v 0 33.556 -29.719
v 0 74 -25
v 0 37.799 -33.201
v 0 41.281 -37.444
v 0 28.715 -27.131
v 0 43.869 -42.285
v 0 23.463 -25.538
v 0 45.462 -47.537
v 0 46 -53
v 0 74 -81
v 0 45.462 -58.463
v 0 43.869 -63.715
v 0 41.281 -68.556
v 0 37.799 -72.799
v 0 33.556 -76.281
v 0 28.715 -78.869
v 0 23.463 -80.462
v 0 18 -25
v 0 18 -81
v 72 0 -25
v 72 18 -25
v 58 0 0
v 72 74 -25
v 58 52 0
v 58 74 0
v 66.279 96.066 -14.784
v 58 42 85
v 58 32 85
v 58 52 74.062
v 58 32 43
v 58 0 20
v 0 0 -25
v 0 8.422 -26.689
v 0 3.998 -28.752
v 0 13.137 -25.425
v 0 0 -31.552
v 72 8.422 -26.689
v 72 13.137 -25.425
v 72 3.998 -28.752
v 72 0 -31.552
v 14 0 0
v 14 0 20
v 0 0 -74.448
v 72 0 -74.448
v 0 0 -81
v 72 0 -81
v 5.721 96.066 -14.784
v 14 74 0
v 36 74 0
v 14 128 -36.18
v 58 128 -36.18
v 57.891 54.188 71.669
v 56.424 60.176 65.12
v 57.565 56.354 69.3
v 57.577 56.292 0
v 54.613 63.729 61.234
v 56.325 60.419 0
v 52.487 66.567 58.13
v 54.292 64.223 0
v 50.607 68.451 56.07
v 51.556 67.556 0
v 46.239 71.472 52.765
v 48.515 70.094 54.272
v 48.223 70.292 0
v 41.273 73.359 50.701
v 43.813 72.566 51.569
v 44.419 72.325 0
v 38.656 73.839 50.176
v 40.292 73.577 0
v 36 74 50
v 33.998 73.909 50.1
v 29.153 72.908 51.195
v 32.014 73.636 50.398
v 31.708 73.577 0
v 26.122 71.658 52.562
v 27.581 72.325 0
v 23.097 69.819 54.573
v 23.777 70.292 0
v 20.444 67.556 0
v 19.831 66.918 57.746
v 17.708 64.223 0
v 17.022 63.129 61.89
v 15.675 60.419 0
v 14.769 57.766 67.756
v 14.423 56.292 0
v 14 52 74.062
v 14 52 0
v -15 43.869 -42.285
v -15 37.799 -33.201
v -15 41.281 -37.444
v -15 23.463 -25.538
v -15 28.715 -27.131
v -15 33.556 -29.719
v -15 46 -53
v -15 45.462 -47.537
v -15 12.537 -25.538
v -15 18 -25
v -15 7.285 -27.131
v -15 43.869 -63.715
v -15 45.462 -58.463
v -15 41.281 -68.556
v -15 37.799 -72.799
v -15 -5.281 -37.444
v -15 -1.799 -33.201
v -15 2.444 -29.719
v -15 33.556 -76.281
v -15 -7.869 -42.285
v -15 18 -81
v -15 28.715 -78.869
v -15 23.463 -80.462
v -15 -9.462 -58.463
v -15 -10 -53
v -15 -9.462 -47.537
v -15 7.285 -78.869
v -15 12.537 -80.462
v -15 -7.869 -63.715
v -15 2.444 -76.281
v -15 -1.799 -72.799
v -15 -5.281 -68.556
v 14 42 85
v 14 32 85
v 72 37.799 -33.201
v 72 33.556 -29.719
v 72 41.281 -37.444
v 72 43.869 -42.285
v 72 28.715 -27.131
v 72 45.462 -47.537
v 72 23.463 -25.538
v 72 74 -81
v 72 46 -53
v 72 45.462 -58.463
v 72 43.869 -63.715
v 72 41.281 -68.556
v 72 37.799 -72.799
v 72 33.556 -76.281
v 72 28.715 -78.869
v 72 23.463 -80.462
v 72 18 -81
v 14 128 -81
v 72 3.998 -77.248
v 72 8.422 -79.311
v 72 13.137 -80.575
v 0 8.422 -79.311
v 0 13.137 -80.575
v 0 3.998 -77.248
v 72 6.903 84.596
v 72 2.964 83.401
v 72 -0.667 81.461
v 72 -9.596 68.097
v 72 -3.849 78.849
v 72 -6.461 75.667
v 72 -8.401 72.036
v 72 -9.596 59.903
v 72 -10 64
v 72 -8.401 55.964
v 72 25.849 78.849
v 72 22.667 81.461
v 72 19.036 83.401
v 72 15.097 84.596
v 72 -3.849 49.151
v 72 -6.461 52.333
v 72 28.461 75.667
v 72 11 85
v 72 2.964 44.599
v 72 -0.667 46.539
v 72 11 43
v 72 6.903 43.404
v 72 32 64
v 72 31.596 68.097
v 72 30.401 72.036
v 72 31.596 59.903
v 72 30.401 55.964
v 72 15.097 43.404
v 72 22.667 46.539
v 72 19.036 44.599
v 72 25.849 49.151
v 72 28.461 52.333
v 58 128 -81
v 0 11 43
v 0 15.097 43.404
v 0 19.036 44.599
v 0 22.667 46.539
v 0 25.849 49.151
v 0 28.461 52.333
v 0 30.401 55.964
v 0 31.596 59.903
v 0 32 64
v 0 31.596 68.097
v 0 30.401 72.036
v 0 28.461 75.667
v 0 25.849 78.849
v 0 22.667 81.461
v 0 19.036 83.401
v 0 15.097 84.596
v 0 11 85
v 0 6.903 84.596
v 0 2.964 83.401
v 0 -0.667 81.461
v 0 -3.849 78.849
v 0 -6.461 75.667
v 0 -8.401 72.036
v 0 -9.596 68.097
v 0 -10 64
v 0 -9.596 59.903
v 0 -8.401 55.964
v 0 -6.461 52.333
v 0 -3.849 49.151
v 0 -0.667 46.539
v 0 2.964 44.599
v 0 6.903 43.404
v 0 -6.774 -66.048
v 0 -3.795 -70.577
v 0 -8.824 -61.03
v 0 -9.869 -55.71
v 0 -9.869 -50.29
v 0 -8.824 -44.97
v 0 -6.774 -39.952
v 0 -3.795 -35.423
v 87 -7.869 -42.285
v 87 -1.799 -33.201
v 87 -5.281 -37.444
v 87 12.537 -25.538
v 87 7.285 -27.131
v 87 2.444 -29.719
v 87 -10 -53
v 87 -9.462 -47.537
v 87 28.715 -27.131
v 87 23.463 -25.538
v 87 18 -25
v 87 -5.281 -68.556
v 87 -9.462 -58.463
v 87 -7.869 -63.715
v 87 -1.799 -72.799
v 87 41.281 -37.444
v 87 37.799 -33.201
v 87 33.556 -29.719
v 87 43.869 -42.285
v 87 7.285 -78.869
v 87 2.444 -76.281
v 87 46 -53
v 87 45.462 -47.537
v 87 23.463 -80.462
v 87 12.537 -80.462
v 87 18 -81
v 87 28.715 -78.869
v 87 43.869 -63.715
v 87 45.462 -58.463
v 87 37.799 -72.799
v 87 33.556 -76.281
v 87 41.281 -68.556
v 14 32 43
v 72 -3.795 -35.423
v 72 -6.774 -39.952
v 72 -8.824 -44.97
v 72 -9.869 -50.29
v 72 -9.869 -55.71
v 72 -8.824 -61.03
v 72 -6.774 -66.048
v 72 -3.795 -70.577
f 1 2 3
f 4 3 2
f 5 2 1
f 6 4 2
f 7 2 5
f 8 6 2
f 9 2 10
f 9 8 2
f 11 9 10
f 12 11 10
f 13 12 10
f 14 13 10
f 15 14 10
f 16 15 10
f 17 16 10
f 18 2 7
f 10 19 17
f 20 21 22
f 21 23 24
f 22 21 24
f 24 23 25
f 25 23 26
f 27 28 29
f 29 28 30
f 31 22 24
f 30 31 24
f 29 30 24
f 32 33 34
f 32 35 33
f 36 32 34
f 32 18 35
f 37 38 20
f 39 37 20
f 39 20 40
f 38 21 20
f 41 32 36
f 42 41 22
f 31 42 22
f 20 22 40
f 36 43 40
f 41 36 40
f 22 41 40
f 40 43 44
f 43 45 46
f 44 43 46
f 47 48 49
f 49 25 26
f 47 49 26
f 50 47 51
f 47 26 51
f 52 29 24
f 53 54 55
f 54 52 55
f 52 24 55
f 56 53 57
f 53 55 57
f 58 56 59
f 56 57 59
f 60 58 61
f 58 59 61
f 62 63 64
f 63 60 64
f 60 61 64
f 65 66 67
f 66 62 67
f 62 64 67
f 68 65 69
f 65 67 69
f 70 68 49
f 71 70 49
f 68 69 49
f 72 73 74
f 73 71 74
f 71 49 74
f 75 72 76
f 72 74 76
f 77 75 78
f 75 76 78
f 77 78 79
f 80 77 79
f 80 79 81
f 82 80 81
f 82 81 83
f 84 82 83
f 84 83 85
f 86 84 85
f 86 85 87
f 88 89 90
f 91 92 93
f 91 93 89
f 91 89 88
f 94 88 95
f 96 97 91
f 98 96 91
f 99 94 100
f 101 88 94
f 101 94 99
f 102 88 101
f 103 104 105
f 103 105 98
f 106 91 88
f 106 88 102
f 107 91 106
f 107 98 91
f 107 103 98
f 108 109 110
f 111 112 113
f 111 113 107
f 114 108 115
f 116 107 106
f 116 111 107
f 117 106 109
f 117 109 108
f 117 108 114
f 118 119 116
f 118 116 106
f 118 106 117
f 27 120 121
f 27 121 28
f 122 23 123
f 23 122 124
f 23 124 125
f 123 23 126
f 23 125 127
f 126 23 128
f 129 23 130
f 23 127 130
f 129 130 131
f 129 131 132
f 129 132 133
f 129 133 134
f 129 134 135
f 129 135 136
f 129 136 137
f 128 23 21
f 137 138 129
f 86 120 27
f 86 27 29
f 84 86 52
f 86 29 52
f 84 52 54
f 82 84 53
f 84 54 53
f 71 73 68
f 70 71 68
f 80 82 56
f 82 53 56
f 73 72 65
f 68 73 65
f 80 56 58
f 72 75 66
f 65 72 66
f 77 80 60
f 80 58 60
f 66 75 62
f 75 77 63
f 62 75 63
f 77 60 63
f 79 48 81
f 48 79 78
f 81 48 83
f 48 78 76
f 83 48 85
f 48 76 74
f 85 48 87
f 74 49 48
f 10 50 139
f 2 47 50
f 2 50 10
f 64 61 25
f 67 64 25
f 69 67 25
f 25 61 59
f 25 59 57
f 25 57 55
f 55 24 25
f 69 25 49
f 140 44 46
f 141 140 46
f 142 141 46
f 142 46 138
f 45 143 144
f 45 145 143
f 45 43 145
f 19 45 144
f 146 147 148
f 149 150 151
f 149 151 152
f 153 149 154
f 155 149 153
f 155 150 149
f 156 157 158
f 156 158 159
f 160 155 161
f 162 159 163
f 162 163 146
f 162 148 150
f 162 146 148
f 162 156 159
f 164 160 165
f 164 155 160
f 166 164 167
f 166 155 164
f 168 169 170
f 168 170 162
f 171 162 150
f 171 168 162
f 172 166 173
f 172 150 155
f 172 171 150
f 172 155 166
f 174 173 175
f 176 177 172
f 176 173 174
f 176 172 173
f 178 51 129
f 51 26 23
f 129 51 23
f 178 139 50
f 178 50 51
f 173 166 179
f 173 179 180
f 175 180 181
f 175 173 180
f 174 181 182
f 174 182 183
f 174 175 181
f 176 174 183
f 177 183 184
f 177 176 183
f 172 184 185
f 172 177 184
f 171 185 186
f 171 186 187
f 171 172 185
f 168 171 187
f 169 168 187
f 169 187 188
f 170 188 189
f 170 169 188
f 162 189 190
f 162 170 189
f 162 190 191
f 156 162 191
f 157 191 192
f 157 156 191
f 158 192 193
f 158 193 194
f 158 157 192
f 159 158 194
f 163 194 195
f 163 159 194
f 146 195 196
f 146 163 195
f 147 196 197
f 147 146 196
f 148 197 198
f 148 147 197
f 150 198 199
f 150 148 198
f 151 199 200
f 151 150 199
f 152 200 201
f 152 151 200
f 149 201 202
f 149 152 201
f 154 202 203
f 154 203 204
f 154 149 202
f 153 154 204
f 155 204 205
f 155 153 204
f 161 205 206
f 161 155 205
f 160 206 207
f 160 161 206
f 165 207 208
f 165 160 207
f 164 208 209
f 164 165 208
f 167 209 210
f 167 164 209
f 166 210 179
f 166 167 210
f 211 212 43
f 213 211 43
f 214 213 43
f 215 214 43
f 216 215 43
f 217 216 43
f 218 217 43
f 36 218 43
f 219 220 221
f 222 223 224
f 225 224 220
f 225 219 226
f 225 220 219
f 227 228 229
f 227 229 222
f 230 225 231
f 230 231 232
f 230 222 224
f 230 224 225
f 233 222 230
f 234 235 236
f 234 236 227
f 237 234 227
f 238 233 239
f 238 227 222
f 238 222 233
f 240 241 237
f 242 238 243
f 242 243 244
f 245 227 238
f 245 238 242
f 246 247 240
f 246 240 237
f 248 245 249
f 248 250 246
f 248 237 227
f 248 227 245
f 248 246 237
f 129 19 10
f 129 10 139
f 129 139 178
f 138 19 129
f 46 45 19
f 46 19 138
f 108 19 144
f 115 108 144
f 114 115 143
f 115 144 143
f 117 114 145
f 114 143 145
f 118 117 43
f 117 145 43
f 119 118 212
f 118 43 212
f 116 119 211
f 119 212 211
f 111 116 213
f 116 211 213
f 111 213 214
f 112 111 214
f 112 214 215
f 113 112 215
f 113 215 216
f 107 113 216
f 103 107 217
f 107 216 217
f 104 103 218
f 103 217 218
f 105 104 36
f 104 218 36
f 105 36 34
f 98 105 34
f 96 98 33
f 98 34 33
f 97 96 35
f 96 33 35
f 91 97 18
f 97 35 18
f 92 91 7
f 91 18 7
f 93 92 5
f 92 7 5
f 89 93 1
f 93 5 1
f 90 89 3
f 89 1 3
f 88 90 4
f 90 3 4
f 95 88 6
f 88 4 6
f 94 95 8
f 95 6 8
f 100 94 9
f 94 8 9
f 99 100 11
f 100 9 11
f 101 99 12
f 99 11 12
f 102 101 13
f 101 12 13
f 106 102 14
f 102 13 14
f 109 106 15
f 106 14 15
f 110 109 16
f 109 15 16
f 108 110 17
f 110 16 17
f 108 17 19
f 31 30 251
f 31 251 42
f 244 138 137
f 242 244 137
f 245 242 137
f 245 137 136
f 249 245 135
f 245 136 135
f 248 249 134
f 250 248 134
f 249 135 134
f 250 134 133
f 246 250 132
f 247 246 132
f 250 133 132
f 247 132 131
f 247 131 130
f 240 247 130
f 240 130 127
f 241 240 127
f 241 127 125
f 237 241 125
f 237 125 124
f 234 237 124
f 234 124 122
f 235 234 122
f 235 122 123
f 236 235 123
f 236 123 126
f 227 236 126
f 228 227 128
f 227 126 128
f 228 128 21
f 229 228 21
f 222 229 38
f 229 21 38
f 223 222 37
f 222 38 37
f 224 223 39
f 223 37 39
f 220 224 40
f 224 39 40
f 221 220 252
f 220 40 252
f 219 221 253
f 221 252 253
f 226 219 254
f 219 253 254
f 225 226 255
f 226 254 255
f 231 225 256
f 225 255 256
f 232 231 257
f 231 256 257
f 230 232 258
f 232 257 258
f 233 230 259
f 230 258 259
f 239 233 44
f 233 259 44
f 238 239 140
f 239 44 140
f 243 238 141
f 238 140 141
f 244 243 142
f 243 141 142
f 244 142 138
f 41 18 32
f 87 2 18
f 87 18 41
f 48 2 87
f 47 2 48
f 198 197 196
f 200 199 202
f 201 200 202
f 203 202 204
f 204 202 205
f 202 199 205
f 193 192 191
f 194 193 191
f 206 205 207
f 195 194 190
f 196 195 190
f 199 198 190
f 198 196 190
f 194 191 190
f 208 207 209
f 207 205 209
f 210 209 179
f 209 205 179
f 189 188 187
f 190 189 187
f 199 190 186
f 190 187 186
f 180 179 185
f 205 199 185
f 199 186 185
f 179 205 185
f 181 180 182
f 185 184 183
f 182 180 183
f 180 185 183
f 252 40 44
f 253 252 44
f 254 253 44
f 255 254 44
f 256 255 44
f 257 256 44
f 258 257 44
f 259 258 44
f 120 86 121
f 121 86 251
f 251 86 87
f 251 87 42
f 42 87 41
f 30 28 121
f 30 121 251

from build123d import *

# Parameters (mm, degrees)
SKETCH1_W           = 72
SKETCH1_H           = 81
BOSS_EXTRUDE1_DEPTH = 128
CUT_EXTRUDE1_DEPTH  = 129
CUT_EXTRUDE2_DEPTH  = 82
CUT_EXTRUDE3_DEPTH  = 128
SKETCH5_R           = 28
BOSS_EXTRUDE2_DEPTH = 15
SKETCH6_R           = 28
BOSS_EXTRUDE3_DEPTH = 15
BOSS_EXTRUDE4_DEPTH = 85
CUT_EXTRUDE4_DEPTH  = 85
SKETCH10_R          = 21
BOSS_EXTRUDE5_DEPTH = 72


with BuildPart() as part:
    # Sketch1 → Boss-Extrude1 (new body)
    with BuildSketch(Plane(origin=(0, 0, 0), x_dir=(1, 0, 0), z_dir=(0, 1, 0))):
        with Locations((36, 40.5)):
            Rectangle(SKETCH1_W, SKETCH1_H)
    extrude(amount=BOSS_EXTRUDE1_DEPTH)

    # Sketch2 → Cut-Extrude1 (cut, through all)
    with BuildSketch(Plane(origin=(0, 128, 0), x_dir=(1, 0, 0), z_dir=(0, 1, 0))):
        Polygon((72, 25), (58, 0), (72, 0), align=None)
        Polygon((14, 0), (0, 0), (0, 25), align=None)
    extrude(amount=-CUT_EXTRUDE1_DEPTH, mode=Mode.SUBTRACT)

    # Sketch3 → Cut-Extrude2 (cut, through all)
    with BuildSketch(Plane.XY):
        Polygon((58, 128), (72, 74), (72, 128), align=None)
        Polygon((14, 128), (0, 74), (0, 128), align=None)
    extrude(amount=-CUT_EXTRUDE2_DEPTH, mode=Mode.SUBTRACT)

    # Sketch4 → Cut-Extrude3 (cut)
    with BuildSketch(Plane(origin=(72, 0, 0), x_dir=(0, 0, -1), z_dir=(1, 0, 0))):
        Polygon((0, 74), (36.18010503, 128), (0, 128), align=None)
    extrude(amount=-CUT_EXTRUDE3_DEPTH, mode=Mode.SUBTRACT)

    # Sketch5 → Boss-Extrude2 (add)
    with BuildSketch(Plane(origin=(72, 0, 0), x_dir=(0, 0, -1), z_dir=(1, 0, 0))):
        with Locations((53, 18)):
            Circle(SKETCH5_R)
    extrude(amount=BOSS_EXTRUDE2_DEPTH)

    # Sketch6 → Boss-Extrude3 (add)
    with BuildSketch(Plane.ZY):
        with Locations(Location((-53, 18, 0), (0, 0, 180))):  # turned: the seam where the file's is
            Circle(SKETCH6_R)
    extrude(amount=BOSS_EXTRUDE3_DEPTH)

    # Sketch8 → Boss-Extrude4 (add)
    with BuildSketch(Plane.XY):
        with BuildLine():
            Line((14, 52), (14, 0))
            Line((14, 0), (58, 0))
            Line((58, 0), (58, 52))
            ThreePointArc((58, 52), (36, 74), (14, 52))
        make_face()
    extrude(amount=BOSS_EXTRUDE4_DEPTH)

    # Sketch9 → Cut-Extrude4 (cut)
    with BuildSketch(Plane(origin=(58, 0, 0), x_dir=(0, 0, -1), z_dir=(1, 0, 0))):
        Polygon((-85, 32), (-43, 32), (-20, 0), (-85, 0), align=None)
        Polygon((-85, 42), (-50, 74), (-85, 74), align=None)
    extrude(amount=-CUT_EXTRUDE4_DEPTH, mode=Mode.SUBTRACT)


with BuildPart() as body_2:
    # Sketch10 → Boss-Extrude5 (new body)
    with BuildSketch(Plane(origin=(72, 0, 0), x_dir=(0, 0, -1), z_dir=(1, 0, 0))):
        with Locations((-64, 11)):
            Circle(SKETCH10_R)
    extrude(amount=-BOSS_EXTRUDE5_DEPTH)


solid = Compound([part.part, body_2.part])
